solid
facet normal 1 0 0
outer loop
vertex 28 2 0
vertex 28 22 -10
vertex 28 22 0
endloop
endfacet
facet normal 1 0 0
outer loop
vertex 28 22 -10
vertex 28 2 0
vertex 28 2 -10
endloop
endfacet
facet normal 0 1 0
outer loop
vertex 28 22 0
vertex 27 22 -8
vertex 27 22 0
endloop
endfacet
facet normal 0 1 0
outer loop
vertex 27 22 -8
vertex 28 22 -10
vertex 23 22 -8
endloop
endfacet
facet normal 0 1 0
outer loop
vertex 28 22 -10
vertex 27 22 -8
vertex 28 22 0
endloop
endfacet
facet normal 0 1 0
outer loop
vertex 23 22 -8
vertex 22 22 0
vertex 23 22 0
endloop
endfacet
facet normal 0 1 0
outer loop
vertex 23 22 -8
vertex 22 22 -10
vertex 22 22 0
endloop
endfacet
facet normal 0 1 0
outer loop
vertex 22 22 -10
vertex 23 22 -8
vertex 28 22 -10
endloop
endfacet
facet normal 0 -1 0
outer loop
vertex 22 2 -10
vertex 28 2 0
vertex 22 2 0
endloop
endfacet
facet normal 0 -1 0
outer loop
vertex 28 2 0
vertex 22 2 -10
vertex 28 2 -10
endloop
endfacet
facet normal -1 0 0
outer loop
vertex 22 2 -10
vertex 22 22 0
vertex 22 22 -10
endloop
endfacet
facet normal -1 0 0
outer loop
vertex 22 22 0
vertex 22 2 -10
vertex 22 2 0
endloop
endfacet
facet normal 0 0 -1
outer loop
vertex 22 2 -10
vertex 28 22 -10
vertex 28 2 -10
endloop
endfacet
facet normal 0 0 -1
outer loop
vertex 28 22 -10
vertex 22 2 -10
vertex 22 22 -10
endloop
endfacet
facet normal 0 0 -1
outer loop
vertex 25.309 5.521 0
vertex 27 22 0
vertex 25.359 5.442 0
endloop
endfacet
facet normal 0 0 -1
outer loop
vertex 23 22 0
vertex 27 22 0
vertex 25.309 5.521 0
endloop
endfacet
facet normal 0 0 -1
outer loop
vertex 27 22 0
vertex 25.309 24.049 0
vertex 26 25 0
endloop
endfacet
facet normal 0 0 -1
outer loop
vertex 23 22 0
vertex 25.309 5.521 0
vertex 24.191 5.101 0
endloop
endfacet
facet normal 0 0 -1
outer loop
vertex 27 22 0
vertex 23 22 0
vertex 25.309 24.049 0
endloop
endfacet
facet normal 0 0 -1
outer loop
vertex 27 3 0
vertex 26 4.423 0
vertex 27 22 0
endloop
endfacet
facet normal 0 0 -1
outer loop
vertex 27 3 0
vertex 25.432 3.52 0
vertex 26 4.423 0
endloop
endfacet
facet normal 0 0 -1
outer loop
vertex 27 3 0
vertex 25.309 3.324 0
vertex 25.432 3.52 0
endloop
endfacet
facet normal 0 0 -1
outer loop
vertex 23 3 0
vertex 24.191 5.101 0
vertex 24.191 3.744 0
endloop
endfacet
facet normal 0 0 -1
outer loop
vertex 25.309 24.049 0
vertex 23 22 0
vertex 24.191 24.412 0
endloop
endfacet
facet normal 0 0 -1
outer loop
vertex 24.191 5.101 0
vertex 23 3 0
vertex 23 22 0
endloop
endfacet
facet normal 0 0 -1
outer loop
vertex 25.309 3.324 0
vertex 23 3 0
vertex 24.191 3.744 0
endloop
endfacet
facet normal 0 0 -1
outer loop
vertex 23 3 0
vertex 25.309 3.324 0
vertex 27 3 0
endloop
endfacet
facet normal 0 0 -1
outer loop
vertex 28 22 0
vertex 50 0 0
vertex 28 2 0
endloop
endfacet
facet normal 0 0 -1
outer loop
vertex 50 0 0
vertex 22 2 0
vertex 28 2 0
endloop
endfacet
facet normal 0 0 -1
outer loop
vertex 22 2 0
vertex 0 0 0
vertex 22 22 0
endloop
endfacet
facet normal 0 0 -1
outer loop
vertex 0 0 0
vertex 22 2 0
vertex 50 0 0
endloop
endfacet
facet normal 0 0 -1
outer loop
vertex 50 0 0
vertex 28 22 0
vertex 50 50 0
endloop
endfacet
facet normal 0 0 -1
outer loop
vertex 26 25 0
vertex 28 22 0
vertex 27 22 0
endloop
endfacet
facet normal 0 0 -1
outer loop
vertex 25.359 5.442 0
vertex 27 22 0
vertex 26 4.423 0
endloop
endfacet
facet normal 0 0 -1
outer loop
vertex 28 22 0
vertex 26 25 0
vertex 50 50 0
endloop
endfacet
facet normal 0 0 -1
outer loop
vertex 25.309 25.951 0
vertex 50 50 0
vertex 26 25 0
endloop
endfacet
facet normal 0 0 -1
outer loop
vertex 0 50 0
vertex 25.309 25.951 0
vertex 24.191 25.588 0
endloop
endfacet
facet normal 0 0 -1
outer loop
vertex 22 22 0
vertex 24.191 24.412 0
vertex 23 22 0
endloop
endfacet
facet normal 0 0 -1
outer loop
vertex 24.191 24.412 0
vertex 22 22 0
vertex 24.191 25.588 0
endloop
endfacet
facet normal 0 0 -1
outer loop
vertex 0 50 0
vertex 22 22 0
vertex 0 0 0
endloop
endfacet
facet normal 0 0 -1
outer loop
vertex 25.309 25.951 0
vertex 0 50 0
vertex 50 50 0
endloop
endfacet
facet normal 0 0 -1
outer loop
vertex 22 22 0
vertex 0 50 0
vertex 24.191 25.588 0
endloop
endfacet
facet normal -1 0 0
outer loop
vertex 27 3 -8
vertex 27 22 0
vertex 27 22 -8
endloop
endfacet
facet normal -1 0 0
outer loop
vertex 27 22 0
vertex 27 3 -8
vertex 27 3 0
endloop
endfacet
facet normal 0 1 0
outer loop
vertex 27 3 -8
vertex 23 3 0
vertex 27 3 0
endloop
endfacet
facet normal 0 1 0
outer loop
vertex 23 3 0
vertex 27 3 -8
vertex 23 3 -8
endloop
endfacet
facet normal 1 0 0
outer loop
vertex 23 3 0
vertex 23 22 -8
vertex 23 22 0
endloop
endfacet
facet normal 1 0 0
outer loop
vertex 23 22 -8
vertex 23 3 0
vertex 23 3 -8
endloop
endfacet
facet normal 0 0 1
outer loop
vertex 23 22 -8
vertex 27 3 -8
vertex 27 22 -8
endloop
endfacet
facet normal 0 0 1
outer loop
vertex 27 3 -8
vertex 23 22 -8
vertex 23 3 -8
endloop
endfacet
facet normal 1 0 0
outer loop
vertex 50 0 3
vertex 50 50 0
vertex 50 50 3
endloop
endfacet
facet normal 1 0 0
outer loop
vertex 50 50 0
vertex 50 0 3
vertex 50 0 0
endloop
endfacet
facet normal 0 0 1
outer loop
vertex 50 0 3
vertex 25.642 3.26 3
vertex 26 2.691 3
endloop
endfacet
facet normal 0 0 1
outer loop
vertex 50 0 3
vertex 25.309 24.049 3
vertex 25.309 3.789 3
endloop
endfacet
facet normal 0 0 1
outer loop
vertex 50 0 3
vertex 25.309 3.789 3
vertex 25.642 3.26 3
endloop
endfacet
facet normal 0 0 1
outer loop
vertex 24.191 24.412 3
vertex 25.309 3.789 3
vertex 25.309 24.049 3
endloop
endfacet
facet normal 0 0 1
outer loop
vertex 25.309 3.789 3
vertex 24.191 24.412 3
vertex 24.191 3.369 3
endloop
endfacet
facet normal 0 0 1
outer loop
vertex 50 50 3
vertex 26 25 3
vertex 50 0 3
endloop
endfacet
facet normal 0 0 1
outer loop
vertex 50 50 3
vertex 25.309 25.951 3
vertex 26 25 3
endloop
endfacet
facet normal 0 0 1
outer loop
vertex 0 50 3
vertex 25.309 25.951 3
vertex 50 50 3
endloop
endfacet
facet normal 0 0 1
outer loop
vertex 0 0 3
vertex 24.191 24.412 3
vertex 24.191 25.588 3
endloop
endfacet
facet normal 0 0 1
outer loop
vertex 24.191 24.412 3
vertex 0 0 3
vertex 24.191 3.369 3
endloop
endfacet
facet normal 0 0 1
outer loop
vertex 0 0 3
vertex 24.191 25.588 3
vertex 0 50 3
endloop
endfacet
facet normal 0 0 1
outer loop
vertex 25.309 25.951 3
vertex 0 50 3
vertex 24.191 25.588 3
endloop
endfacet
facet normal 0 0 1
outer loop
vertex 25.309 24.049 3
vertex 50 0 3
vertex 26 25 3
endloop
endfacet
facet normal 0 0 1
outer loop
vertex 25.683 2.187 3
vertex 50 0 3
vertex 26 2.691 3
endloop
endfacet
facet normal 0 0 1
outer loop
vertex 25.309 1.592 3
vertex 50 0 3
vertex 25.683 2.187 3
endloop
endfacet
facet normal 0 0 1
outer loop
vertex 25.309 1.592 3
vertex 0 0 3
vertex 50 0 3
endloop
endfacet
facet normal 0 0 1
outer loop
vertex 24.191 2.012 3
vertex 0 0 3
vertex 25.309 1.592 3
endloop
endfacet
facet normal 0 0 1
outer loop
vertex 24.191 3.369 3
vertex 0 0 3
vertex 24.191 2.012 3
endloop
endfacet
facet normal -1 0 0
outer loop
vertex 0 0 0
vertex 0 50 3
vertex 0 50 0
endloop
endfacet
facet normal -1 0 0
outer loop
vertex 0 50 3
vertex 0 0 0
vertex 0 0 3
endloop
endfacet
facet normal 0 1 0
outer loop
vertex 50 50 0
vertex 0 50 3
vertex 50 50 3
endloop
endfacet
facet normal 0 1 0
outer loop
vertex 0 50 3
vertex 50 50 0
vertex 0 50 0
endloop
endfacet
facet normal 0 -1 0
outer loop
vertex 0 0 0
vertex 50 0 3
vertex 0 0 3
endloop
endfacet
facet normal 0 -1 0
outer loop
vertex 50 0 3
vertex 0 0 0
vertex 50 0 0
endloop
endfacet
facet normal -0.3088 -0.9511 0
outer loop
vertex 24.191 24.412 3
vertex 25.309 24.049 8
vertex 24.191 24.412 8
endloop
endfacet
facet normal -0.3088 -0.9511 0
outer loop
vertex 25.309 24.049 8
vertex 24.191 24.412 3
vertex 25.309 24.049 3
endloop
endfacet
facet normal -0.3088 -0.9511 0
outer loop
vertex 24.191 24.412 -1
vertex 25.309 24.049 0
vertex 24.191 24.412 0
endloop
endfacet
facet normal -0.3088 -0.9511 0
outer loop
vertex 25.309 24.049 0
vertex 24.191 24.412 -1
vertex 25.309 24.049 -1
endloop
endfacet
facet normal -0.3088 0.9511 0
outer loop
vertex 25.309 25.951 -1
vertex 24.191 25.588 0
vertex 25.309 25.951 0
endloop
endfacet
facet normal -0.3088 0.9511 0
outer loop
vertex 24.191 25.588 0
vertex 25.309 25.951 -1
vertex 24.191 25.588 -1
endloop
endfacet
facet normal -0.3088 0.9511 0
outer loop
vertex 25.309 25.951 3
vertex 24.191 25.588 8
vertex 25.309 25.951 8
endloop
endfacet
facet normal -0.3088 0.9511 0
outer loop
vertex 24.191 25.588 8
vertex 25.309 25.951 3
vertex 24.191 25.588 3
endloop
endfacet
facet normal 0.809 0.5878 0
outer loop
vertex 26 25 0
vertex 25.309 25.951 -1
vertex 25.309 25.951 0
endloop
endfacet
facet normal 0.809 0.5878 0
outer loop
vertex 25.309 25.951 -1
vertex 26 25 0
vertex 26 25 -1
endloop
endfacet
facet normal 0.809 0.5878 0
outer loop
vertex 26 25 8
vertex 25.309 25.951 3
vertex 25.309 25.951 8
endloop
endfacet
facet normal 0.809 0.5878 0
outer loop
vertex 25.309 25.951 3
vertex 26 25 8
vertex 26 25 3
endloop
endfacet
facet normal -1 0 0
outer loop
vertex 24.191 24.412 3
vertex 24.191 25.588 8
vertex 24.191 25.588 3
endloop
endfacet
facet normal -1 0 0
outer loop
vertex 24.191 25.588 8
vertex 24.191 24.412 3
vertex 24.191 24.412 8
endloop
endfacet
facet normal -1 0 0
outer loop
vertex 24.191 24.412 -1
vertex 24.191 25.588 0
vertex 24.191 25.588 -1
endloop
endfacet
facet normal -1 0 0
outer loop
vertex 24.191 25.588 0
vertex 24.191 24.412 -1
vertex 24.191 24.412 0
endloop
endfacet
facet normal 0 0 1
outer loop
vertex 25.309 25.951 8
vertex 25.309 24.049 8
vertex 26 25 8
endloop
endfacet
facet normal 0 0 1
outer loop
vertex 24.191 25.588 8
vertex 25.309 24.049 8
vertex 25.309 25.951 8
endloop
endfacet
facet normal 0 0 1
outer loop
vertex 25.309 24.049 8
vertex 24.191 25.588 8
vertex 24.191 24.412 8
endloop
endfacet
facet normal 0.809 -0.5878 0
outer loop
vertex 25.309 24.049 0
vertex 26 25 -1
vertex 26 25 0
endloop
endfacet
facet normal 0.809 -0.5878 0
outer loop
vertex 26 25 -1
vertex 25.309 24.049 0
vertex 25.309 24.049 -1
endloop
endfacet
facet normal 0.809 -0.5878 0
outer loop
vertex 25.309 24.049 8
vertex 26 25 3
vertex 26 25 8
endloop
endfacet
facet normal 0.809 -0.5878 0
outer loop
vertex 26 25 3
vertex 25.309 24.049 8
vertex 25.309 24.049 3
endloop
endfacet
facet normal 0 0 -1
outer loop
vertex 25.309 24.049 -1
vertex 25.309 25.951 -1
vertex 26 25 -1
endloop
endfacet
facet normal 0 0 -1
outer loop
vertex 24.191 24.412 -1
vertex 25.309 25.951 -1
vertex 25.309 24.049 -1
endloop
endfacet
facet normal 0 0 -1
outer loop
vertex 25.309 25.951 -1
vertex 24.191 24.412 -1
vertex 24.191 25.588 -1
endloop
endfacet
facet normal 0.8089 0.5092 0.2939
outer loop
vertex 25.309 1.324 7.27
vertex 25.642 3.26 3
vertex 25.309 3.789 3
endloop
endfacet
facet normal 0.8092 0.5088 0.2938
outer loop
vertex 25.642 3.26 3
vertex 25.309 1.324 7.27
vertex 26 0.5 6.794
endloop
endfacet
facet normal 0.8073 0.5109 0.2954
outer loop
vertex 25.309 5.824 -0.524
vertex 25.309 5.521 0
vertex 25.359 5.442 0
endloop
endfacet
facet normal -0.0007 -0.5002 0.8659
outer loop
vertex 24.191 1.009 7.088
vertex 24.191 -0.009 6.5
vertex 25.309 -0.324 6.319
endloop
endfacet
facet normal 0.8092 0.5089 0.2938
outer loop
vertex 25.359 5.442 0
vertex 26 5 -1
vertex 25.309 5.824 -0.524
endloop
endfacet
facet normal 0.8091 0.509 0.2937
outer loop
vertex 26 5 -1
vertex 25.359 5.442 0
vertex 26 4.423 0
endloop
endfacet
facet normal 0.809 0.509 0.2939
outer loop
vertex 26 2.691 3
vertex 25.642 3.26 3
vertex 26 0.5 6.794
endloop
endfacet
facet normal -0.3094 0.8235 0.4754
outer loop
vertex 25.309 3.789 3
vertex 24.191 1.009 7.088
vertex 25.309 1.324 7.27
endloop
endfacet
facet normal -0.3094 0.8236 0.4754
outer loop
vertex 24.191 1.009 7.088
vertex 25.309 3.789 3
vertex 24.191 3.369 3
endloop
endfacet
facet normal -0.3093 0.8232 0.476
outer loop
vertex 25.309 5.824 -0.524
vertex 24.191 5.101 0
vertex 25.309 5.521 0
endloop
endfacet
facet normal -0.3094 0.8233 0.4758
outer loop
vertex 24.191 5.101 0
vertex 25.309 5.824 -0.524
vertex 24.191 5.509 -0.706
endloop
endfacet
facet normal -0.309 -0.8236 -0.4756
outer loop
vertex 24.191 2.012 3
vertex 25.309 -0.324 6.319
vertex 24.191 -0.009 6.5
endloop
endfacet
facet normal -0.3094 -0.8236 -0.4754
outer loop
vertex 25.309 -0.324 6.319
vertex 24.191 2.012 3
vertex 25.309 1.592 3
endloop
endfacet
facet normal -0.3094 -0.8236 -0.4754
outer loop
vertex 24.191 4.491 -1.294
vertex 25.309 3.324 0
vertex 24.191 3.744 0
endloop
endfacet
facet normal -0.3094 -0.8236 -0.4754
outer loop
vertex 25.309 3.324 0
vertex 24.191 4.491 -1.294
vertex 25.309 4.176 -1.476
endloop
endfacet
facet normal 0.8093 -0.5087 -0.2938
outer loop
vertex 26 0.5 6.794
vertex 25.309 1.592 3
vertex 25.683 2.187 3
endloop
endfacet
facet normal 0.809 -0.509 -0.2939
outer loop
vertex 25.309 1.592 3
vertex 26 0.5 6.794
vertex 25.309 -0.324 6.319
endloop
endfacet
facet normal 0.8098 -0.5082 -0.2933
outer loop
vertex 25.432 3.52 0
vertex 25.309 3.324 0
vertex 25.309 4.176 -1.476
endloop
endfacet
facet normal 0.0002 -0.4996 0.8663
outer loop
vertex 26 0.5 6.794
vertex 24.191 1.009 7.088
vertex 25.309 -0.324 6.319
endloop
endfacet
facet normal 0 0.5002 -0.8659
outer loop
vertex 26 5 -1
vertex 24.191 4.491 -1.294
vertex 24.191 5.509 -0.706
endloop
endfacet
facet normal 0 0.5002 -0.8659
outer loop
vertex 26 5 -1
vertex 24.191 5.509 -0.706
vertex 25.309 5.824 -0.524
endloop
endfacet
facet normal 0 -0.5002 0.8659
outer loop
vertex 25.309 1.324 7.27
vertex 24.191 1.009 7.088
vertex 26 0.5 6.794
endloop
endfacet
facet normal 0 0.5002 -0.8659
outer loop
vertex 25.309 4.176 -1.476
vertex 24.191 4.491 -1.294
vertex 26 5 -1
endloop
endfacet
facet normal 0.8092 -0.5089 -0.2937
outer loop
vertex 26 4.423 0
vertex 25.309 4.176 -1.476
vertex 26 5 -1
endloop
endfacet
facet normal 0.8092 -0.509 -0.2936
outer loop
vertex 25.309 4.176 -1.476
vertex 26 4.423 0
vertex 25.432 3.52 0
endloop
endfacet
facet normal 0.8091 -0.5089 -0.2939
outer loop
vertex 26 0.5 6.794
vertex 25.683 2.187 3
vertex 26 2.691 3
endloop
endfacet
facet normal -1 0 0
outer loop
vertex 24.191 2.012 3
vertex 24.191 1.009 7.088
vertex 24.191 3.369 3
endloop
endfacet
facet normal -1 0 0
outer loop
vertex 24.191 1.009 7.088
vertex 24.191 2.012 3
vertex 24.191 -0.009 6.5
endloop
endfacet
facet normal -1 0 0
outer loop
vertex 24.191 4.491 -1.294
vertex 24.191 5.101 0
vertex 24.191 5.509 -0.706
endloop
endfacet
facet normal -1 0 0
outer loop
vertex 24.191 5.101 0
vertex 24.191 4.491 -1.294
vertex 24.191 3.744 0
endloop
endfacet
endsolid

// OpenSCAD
platex = 50;
platey = 50;
platez = 3;

spoutHD = 2;

//tolerance
tol = 0.1;


module container(){
    difference(){
    cube([6,10,20]);
    
    translate([1,-2,1]){
        cube([4,10,20]);
        }//end translate
    }//end difference
    
}//end module
    
//difference(){
union(){
cube([platex,platey,platez]);

    translate([platex/2-3,2,0]){
    rotate([-90,0,0]){
    container();
    }//end rotate
}//end translate
}//end union


translate([platex/2,platey/2,-1]){
    cylinder(d=spoutHD,h=3*platez);
    
    }//end translate

translate([platex/2,5,-1]){
    rotate([30,0,0])
    cylinder(d=spoutHD,h=3*platez);
    
    }//end translate


//}
